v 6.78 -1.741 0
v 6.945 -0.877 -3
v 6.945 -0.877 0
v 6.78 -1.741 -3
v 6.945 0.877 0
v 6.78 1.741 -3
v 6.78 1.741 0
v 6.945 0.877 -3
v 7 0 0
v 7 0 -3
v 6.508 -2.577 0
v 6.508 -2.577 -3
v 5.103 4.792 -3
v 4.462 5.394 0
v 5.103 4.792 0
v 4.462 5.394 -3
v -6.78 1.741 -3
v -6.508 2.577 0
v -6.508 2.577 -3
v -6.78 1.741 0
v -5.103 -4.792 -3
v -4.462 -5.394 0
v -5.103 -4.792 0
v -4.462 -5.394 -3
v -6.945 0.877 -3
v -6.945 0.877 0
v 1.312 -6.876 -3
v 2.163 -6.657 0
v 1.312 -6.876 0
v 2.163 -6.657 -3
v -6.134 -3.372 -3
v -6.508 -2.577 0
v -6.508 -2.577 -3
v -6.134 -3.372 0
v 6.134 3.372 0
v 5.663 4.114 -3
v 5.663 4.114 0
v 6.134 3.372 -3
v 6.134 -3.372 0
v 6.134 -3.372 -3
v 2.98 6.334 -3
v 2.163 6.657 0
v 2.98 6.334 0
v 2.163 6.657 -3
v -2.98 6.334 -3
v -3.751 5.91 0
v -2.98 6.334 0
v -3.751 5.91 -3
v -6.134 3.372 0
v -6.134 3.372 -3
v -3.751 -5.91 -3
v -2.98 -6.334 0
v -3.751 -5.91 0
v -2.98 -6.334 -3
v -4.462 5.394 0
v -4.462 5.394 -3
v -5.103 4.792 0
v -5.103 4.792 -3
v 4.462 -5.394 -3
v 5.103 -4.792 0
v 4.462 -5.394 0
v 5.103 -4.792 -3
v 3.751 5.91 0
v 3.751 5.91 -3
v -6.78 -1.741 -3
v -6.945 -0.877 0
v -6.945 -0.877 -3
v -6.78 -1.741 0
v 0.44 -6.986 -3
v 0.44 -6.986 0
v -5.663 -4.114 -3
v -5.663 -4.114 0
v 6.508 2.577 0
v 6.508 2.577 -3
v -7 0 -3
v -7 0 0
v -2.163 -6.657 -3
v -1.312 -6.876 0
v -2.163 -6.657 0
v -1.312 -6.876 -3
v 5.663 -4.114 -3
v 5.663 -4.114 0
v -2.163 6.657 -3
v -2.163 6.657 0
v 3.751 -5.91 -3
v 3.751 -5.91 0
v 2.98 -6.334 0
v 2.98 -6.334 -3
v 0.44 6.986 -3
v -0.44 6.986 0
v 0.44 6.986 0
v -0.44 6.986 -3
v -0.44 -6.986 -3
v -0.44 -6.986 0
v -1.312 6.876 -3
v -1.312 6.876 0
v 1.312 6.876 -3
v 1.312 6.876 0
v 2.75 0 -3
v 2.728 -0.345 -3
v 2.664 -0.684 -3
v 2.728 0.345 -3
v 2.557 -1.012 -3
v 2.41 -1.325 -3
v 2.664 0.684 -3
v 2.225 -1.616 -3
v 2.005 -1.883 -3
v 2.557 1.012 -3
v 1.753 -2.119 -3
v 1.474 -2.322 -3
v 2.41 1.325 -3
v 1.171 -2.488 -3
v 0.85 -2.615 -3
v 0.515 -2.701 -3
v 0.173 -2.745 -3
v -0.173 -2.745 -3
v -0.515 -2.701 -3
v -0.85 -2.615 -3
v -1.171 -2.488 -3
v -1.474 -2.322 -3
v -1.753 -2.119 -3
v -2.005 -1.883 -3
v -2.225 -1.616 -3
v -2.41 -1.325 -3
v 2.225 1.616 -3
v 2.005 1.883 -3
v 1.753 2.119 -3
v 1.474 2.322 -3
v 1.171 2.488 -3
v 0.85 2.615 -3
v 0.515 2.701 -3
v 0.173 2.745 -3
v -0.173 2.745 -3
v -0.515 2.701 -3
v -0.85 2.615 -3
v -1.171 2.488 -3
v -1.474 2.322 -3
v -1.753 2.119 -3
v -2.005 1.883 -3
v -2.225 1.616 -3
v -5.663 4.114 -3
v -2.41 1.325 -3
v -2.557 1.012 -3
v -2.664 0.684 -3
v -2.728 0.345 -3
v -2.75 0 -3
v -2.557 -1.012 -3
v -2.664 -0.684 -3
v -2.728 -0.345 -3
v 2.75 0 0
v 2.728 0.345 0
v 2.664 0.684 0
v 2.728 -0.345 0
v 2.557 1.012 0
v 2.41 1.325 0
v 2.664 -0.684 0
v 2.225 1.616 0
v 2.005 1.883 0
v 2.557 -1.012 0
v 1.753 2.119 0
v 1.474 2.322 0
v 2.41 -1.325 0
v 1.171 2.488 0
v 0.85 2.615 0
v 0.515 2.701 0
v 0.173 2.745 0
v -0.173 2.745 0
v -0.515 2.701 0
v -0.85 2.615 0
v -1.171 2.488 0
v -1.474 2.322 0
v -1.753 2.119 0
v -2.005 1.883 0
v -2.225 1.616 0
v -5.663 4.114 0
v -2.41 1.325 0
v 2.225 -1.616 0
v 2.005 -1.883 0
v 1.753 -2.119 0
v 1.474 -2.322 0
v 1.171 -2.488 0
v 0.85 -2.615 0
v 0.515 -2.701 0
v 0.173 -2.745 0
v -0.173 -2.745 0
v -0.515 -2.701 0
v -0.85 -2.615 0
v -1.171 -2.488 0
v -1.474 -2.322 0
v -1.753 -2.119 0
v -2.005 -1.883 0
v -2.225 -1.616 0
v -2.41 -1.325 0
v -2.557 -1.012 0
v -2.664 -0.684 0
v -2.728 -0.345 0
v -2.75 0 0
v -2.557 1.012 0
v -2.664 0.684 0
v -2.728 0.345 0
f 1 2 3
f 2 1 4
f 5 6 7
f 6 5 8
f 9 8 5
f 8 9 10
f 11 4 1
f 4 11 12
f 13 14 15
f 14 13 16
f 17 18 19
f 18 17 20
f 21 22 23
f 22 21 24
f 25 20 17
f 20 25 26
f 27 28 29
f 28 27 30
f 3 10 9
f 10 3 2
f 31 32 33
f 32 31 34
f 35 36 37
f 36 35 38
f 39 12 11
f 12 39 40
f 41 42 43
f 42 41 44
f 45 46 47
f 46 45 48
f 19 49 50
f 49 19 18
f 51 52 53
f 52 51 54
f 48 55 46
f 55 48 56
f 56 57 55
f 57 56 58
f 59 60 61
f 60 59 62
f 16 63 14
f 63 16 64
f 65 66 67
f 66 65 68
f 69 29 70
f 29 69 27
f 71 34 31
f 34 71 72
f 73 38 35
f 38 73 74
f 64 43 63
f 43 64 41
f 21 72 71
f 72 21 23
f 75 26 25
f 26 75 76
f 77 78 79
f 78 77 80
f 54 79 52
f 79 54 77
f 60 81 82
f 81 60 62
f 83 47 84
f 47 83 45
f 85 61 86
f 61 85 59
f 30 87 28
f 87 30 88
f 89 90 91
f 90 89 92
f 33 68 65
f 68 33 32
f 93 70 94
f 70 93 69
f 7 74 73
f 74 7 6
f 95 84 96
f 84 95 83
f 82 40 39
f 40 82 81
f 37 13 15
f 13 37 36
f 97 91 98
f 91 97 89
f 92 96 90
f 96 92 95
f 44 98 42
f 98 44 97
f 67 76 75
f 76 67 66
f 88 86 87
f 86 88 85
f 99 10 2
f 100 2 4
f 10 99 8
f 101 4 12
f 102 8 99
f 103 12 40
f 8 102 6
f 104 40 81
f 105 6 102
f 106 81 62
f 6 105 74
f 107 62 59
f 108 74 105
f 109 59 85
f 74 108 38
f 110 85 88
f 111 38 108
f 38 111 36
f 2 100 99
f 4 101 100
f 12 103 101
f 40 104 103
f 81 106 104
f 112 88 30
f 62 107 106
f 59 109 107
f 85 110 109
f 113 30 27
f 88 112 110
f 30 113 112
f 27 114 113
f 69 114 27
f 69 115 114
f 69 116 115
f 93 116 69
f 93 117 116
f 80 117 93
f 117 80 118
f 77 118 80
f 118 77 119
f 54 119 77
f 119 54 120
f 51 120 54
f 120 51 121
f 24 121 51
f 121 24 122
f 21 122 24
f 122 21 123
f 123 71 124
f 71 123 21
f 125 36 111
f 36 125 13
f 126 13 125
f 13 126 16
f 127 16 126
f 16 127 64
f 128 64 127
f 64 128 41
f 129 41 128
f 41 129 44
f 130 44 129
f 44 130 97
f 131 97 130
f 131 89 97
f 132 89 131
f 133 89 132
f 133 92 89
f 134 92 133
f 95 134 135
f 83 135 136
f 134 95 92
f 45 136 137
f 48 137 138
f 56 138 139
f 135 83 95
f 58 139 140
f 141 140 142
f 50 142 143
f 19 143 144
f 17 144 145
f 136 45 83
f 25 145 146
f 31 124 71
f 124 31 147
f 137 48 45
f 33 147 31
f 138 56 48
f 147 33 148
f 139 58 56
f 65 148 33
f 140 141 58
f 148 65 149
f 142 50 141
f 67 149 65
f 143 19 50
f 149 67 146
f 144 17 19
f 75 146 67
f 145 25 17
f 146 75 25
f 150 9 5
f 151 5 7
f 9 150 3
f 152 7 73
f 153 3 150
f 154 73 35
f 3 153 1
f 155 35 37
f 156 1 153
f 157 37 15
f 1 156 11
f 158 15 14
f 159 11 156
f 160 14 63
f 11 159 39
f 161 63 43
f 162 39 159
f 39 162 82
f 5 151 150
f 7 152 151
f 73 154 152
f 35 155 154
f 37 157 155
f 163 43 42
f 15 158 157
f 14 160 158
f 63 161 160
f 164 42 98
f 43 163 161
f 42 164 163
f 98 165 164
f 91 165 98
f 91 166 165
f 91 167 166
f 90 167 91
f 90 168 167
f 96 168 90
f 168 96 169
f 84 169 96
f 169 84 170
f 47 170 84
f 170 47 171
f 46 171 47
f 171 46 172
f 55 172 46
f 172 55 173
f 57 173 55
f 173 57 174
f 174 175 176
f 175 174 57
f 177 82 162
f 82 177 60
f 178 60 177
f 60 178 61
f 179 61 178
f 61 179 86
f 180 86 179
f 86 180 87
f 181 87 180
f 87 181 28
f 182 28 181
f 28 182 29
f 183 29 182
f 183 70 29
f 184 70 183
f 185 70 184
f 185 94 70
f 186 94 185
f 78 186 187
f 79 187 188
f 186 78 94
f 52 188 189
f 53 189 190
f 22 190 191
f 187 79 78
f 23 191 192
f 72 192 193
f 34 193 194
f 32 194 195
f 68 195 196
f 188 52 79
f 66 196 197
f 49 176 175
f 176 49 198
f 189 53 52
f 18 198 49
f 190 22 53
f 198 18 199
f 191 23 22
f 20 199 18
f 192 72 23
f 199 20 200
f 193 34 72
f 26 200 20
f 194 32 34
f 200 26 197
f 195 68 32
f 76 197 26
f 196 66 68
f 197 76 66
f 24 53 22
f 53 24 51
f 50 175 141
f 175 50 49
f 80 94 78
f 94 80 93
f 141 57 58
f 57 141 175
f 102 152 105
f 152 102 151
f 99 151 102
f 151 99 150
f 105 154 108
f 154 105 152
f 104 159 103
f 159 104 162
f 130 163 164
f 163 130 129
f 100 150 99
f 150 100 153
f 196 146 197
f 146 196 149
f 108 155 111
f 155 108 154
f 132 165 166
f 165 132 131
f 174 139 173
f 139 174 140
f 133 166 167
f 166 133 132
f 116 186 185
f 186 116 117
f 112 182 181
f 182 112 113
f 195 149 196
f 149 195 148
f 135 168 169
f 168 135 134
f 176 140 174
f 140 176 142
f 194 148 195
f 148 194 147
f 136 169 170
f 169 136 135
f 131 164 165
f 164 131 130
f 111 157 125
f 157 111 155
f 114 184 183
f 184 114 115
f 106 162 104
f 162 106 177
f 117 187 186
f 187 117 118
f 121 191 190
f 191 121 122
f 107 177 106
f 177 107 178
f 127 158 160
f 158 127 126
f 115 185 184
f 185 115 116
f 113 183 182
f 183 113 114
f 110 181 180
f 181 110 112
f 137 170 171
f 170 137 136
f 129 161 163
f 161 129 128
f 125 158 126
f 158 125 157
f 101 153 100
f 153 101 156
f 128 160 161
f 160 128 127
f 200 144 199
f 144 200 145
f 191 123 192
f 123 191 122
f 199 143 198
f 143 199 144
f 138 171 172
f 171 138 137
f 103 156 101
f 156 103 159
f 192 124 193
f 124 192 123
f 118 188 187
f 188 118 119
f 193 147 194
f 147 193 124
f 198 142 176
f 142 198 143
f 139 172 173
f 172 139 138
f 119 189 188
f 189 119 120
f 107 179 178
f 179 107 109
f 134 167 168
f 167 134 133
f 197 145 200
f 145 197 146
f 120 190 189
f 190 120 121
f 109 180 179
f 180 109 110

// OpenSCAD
$fn = 50;


difference() {
	union() {
		translate(v = [0, 0, -3.0000000000]) {
			cylinder(h = 3, r = 7.0000000000);
		}
	}
	union() {
		#translate(v = [0, 0, -3]) {
			cylinder(h = 3, r = 2.7500000000);
		}
	}
}
